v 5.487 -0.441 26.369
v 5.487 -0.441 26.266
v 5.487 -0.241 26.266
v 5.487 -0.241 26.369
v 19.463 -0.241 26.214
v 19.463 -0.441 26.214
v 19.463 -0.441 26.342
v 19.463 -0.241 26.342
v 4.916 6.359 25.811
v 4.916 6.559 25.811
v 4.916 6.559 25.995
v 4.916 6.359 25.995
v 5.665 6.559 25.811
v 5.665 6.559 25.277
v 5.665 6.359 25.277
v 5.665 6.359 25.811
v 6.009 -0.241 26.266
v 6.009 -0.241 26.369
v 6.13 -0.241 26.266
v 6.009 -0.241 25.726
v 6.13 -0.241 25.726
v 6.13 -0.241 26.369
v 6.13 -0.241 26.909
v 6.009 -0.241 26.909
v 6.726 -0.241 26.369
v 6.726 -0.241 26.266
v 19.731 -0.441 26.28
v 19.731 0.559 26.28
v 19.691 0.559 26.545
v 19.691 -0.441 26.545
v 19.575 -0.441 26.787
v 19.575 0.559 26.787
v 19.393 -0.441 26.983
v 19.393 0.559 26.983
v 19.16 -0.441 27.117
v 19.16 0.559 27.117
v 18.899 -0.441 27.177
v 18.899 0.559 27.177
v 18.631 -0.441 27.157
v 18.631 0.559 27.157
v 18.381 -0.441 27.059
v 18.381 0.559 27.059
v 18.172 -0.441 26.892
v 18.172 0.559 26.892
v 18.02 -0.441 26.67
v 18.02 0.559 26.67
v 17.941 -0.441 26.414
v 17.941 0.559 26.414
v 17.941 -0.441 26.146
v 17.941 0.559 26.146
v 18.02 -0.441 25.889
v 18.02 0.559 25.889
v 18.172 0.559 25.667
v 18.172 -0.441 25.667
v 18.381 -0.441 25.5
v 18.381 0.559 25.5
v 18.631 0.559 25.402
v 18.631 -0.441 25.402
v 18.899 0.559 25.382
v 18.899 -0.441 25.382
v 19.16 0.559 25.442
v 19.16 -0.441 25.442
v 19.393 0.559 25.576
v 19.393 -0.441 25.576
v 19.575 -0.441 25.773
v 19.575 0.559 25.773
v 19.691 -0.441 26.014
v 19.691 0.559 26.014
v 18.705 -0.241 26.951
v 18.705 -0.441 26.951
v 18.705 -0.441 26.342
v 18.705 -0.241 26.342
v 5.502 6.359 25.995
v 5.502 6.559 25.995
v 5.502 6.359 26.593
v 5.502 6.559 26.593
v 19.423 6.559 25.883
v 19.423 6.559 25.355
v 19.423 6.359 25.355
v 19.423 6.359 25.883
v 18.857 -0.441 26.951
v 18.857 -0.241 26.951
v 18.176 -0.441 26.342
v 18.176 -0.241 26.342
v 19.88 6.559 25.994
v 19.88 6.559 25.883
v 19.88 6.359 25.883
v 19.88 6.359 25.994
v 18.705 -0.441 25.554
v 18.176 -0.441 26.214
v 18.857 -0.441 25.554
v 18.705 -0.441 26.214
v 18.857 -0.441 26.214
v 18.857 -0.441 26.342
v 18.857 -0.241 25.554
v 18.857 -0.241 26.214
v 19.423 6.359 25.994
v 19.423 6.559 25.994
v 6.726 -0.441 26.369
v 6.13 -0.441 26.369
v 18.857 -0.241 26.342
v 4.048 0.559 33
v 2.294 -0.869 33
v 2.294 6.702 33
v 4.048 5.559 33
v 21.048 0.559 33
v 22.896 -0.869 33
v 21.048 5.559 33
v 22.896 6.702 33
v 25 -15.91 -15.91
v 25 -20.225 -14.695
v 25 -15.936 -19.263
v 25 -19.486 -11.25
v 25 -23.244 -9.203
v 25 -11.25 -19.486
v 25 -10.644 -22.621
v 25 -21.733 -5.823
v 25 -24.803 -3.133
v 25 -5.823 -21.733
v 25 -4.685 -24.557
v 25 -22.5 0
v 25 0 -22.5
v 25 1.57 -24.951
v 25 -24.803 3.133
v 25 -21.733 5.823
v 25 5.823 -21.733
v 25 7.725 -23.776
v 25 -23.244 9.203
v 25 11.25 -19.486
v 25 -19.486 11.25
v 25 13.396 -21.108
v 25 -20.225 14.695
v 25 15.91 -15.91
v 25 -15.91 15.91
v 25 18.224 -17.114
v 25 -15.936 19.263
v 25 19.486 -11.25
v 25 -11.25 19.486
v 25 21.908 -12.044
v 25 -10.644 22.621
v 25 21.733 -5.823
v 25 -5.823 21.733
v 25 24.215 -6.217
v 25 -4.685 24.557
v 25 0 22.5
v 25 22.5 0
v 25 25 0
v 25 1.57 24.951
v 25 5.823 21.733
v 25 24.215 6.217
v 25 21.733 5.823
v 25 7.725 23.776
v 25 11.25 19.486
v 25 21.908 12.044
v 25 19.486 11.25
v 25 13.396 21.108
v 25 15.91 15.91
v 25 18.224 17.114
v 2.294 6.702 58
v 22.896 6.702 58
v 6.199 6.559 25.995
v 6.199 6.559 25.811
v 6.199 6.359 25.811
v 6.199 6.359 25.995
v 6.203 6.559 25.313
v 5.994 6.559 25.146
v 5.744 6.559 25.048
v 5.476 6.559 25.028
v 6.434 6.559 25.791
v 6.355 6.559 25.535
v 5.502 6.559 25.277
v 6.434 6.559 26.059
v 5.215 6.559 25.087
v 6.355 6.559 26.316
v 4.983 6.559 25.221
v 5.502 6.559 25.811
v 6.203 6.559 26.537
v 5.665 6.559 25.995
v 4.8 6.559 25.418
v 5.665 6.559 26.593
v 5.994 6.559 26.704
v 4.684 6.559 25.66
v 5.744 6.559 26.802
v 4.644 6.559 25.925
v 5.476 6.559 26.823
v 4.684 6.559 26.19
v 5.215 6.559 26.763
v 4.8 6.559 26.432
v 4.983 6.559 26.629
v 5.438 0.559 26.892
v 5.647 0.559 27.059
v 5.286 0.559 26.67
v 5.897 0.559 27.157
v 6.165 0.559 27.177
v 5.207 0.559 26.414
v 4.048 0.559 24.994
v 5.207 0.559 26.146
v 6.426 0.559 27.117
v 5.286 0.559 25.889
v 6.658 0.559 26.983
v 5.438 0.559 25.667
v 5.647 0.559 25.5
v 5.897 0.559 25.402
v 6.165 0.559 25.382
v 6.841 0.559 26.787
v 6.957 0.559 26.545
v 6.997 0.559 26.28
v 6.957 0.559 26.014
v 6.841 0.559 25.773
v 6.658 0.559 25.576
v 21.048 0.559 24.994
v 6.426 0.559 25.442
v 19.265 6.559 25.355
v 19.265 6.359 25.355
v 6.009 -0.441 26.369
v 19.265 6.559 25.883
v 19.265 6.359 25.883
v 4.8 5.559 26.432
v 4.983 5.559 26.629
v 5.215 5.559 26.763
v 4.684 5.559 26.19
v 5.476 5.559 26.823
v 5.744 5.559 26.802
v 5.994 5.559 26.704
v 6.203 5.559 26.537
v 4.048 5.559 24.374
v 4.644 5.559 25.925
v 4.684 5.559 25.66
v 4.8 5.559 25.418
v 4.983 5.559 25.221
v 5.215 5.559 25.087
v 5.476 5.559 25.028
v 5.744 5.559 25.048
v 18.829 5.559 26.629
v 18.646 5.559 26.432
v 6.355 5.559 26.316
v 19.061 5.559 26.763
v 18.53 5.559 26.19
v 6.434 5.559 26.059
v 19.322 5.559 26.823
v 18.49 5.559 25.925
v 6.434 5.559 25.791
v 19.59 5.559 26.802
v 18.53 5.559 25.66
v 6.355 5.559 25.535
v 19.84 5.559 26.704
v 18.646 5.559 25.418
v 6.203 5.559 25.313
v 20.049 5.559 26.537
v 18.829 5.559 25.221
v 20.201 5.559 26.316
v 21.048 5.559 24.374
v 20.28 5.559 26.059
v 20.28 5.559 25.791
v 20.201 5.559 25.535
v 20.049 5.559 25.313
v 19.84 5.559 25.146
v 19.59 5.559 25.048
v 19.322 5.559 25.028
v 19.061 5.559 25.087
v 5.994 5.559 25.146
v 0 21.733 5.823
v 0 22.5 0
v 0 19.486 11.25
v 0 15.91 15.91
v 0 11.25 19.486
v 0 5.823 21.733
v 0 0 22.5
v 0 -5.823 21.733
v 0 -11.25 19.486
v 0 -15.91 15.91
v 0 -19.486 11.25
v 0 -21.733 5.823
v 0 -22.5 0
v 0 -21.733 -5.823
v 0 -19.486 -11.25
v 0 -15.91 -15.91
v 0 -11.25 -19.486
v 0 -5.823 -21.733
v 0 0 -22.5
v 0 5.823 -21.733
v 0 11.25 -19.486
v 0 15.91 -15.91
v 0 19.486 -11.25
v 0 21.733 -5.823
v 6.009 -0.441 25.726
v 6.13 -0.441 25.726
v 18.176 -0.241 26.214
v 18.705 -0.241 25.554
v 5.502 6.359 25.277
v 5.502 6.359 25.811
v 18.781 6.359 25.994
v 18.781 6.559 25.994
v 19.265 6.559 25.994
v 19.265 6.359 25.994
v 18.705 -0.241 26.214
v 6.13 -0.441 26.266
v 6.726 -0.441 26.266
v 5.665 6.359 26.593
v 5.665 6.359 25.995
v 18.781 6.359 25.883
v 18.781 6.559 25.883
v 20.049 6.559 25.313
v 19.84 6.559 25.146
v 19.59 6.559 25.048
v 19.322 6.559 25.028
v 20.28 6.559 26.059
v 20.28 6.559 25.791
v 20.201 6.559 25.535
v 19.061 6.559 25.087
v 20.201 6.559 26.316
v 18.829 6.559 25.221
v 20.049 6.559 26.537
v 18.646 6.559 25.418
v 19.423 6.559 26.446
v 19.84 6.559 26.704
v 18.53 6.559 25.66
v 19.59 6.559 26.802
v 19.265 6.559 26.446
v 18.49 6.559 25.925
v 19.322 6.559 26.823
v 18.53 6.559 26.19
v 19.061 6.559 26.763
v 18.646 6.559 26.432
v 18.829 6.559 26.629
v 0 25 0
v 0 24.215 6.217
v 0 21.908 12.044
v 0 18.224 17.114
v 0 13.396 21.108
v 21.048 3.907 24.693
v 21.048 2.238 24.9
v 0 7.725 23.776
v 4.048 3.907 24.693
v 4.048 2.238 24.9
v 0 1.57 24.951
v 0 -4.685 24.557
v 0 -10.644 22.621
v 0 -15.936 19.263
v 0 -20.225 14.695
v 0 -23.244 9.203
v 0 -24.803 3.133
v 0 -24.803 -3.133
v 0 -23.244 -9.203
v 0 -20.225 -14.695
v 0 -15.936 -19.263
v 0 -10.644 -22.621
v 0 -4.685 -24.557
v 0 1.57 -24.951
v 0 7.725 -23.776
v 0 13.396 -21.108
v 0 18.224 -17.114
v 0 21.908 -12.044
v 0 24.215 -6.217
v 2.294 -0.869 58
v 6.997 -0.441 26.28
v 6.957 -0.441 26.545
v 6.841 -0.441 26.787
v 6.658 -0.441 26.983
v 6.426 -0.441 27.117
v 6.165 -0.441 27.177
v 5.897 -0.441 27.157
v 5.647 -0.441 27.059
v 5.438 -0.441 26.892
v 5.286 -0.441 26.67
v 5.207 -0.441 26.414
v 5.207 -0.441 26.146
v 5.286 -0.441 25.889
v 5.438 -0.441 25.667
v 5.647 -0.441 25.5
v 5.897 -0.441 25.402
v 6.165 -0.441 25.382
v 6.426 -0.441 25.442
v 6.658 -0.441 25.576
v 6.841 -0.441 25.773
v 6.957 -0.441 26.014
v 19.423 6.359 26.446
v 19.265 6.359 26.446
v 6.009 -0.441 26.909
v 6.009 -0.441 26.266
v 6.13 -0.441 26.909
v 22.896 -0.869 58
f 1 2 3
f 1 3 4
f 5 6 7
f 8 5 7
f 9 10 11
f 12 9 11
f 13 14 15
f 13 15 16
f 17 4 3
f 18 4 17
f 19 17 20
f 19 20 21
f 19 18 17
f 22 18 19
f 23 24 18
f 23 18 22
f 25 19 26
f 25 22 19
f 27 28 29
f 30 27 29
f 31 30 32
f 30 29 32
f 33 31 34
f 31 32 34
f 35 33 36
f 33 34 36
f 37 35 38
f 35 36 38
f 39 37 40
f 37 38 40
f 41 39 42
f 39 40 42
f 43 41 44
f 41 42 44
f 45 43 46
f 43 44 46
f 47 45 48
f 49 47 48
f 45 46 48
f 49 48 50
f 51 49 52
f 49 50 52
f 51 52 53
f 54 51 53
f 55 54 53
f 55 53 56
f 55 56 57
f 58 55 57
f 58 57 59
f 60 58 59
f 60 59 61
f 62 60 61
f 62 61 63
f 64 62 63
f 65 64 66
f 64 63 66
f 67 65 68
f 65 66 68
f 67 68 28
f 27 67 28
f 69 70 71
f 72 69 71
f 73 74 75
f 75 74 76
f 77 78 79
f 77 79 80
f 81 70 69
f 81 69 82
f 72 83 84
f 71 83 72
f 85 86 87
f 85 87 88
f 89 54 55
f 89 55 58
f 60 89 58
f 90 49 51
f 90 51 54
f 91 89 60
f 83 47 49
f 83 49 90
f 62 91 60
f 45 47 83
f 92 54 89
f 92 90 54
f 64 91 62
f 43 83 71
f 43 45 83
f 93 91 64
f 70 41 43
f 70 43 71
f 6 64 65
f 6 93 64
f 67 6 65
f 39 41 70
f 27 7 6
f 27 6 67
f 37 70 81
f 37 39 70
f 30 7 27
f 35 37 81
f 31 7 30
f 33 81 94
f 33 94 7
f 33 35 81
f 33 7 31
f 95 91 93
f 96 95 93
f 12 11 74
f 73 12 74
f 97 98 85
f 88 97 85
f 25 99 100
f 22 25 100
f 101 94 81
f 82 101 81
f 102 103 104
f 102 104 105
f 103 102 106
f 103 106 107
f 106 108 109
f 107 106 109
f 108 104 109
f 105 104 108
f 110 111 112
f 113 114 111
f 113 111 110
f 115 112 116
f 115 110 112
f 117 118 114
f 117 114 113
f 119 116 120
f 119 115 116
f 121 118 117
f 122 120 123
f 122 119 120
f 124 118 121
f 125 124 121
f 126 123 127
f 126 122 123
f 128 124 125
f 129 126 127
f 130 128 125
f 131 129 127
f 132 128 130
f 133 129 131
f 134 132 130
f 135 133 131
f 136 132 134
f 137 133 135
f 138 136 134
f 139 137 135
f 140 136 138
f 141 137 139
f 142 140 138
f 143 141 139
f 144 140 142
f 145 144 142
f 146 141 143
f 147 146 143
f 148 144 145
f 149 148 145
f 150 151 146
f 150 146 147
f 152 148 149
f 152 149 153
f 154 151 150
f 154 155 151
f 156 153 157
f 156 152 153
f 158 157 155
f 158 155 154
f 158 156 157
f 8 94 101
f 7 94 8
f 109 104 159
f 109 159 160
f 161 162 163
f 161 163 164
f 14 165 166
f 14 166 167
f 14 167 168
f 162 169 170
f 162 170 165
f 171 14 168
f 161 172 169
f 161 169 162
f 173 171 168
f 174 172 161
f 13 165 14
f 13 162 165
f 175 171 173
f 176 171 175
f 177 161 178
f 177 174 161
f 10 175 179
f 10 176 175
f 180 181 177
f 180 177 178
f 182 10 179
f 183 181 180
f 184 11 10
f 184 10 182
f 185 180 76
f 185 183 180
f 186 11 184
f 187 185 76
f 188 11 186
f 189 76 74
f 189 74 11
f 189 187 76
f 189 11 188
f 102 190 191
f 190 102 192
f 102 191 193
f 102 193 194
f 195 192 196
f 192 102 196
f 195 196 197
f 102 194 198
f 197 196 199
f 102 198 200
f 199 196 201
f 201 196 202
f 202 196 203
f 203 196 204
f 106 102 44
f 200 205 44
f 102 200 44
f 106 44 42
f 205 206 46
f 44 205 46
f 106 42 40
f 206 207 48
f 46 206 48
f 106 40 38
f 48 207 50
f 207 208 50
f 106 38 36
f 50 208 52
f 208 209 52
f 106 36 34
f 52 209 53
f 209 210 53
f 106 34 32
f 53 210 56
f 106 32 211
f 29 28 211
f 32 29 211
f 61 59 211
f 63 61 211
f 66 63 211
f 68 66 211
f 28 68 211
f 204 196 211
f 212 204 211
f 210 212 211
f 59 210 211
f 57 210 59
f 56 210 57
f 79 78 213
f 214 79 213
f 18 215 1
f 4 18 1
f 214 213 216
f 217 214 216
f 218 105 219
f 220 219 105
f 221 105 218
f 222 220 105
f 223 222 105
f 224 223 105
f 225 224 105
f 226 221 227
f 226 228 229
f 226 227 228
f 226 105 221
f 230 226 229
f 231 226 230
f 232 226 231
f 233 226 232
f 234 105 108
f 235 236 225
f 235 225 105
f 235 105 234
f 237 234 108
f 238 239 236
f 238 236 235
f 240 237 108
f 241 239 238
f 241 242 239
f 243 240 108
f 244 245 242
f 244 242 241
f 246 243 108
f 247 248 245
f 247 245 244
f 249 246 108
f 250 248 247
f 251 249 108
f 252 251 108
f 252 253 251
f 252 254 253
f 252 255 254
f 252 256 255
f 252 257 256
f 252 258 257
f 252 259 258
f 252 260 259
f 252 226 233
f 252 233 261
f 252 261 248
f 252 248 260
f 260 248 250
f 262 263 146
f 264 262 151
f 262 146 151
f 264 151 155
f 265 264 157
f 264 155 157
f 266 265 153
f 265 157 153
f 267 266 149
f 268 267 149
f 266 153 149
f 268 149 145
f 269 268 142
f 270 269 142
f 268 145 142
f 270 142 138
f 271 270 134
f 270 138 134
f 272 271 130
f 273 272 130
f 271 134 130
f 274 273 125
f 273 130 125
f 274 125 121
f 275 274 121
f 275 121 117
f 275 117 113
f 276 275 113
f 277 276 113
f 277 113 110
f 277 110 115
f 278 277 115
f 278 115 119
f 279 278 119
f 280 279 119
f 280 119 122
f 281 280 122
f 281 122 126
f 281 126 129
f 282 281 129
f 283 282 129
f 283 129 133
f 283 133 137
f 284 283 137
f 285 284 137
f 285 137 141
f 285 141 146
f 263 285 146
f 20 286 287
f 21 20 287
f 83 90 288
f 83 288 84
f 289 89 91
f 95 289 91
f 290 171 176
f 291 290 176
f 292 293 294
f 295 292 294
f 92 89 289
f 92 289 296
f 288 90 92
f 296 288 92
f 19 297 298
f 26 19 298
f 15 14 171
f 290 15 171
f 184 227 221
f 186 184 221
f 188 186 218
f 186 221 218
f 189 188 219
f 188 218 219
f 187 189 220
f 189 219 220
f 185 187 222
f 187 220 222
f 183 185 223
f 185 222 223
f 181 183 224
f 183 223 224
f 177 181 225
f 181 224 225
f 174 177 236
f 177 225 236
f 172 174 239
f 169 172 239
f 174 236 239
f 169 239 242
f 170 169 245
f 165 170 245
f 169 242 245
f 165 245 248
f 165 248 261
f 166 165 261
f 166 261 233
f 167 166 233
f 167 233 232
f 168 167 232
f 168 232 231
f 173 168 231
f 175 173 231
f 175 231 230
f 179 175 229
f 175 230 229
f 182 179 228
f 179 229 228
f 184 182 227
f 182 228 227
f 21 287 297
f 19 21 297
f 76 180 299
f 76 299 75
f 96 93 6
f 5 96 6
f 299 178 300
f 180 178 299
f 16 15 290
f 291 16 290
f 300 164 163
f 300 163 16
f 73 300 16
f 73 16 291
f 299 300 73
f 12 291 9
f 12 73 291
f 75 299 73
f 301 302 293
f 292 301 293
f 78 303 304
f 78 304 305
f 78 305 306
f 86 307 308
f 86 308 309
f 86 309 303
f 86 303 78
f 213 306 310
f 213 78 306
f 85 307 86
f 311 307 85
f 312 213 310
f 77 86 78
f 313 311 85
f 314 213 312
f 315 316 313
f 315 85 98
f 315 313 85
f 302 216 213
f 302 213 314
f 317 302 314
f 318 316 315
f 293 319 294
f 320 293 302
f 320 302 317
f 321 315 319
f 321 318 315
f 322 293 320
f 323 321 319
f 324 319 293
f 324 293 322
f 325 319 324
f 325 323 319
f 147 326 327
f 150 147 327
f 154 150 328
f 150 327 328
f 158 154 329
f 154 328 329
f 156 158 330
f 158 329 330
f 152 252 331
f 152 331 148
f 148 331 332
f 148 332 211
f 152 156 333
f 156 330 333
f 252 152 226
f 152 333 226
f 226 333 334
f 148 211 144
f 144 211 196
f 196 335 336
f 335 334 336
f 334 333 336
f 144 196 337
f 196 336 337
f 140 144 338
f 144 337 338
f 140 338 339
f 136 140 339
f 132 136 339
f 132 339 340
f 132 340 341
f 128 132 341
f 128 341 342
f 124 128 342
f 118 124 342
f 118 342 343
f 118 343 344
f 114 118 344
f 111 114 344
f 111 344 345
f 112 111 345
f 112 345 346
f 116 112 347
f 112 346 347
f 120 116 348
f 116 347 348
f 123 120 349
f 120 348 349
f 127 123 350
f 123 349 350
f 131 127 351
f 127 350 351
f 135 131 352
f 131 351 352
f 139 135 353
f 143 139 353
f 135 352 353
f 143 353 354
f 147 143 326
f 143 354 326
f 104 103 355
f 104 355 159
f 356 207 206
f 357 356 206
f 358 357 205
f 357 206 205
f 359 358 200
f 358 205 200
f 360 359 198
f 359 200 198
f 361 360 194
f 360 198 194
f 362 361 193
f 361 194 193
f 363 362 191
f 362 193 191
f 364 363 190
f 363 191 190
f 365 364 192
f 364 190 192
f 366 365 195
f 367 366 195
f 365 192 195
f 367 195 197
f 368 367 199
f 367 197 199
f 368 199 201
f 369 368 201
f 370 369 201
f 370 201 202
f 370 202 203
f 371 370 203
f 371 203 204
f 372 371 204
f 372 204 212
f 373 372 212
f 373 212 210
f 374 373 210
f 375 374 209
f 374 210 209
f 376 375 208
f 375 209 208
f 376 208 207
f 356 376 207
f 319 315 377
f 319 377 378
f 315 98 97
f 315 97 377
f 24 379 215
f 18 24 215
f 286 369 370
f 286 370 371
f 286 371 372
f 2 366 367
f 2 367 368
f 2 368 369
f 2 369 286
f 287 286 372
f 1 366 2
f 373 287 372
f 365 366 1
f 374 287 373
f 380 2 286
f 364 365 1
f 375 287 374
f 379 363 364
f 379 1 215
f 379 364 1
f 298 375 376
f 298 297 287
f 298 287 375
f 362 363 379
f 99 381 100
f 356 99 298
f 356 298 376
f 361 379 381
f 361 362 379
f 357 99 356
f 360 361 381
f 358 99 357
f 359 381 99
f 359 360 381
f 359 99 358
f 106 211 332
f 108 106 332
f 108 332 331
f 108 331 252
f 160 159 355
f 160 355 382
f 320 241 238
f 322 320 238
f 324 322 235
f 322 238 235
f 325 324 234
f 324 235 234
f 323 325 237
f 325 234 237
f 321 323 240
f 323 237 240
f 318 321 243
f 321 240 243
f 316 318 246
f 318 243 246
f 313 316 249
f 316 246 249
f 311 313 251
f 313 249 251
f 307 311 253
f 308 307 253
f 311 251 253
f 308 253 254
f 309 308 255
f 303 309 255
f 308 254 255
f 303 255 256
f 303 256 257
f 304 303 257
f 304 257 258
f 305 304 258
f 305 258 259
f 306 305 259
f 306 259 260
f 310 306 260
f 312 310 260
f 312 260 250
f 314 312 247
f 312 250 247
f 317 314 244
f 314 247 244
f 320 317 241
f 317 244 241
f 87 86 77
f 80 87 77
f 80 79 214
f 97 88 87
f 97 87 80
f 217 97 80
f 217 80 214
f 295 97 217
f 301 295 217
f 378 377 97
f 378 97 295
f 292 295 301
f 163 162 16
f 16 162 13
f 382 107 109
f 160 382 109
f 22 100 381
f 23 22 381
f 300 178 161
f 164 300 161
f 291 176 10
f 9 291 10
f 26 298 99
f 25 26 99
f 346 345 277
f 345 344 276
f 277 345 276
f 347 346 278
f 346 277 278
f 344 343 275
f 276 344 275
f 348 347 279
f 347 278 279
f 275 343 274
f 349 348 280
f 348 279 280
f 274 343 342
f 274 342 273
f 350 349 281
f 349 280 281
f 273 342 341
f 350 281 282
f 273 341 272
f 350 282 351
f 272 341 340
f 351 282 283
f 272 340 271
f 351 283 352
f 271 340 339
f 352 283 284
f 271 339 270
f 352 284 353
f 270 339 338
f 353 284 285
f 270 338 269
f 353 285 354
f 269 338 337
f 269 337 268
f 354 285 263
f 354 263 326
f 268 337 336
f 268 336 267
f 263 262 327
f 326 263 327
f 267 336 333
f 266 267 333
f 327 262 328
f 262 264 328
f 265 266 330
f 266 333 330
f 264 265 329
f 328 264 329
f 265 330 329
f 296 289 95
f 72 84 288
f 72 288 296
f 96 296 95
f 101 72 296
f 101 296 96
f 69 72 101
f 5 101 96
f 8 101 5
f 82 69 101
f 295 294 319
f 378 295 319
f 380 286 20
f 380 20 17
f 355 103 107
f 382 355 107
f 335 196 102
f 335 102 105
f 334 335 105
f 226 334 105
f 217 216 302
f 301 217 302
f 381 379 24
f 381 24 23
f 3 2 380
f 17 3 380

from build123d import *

# Parameters (mm, degrees)
F0_R      = 25
F1_DEPTH  = 25
F2_R      = 22.5
F3_DEPTH  = 30
F5_W      = 17
F5_H      = 5
F6_DEPTH  = 10
F7_R      = 0.9
F8_DEPTH  = 1
F9_W      = 0.4566367716
F9_H      = 0.1114215702
F9_W_2    = 0.1583136618
F9_H_2    = 0.5275197327
F9_W_3    = 0.4842821509
F9_H_3    = 0.4520714283
F10_DEPTH = 0.2
F11_W     = 0.1633954234
F11_H     = 0.5346611142
F11_W_2   = 0.5340673961
F11_H_2   = 0.1833848655
F11_W_3   = 0.5863611586
F11_H_3   = 0.598071143
F12_DEPTH = 0.2
F13_R     = 0.9
F14_DEPTH = 1
F16_W     = 0.1523271203
F16_H     = 0.6093140692
F16_H_2   = 0.1280289143
F16_W_2   = 0.5286876112
F16_W_3   = 0.605950132
F16_H_3   = 0.6601605564
F17_DEPTH = 0.2
F15_W     = 0.1208484173
F15_H     = 0.469468534
F15_H_2   = 0.0698883086
F15_W_2   = 0.0528423116
F15_H_3   = 0.1033879817
F15_W_3   = 0.0704331324
F15_W_4   = 0.469468534
F15_H_4   = 0.5403161049
F15_W_5   = 0.5258051679
F18_DEPTH = 0.2
F19_W     = 20.6024695653
F19_H     = 7.5707876822
F19_W_2   = 17
F19_H_2   = 5
F20_DEPTH = 25


with BuildPart() as f1:
    # F0 (on Right) → F1 (new body)
    with BuildSketch(Plane.YZ):
        Circle(F0_R)
    extrude(amount=F1_DEPTH)

    # F2 (on face) → F3 (cut)
    with BuildSketch(Plane.YZ.offset(25)):
        Circle(F2_R)
    extrude(amount=-F3_DEPTH, mode=Mode.SUBTRACT)

    # F5 (on offset) → F6 (join)
    with BuildSketch(Plane.XY.offset(23)):
        with Locations((12.5475367568, 3.0585098453)):
            Rectangle(F5_W, F5_H)
    extrude(amount=F6_DEPTH)

    # F7 (on face) → F8 (join)
    with BuildSketch(Plane(origin=(0, 5.5585098453, 0), x_dir=(-1, 0, 0), z_dir=(0, 1, 0))):
        with Locations((-19.3896782356, 25.9250514209)):
            Circle(F7_R)
        with Locations((-5.5436493817, 25.9250514209)):
            Circle(F7_R)
    extrude(amount=F8_DEPTH)

    # F9 (on face) → F10 (cut)
    with BuildSketch(Plane(origin=(0, 6.5585098453, 0), x_dir=(-1, 0, 0), z_dir=(0, 1, 0))):
        with Locations((-19.6518069133, 25.9384280071)):
            Rectangle(F9_W, F9_H)
        with Locations((-19.3443316966, 25.9384280071)):
            Rectangle(F9_W_2, F9_H)
        with Locations((-19.3443316966, 25.6189573556)):
            Rectangle(F9_W_2, F9_H_2)
        with Locations((-19.0230337903, 25.9384280071)):
            Rectangle(F9_W_3, F9_H)
        with Locations((-19.3443316966, 26.2201745063)):
            Rectangle(F9_W_2, F9_H_3)
    extrude(amount=-F10_DEPTH, mode=Mode.SUBTRACT)

    # F11 (on face) → F12 (cut)
    with BuildSketch(Plane(origin=(0, 6.5585098453, 0), x_dir=(-1, 0, 0), z_dir=(0, 1, 0))):
        with Locations((-5.5837228429, 25.5438815802)):
            Rectangle(F11_W, F11_H)
        with Locations((-5.9324542526, 25.9029045701)):
            Rectangle(F11_W_2, F11_H_2)
        with Locations((-5.5837228429, 25.9029045701)):
            Rectangle(F11_W, F11_H_2)
        with Locations((-5.2088445518, 25.9029045701)):
            Rectangle(F11_W_3, F11_H_2)
        with Locations((-5.5837228429, 26.2936325744)):
            Rectangle(F11_W, F11_H_3)
    extrude(amount=-F12_DEPTH, mode=Mode.SUBTRACT)

    # F13 (on face) → F14 (join)
    with BuildSketch(Plane.XZ.offset(-0.5585098453)):
        with Locations((6.0973112057, 26.2796394527)):
            Circle(F13_R)
        with Locations((18.8313634067, 26.2796394527)):
            Circle(F13_R)
    extrude(amount=F14_DEPTH)

    # F16 (on face) → F17 (cut)
    with BuildSketch(Plane.XZ.offset(0.4414901547)):
        with Locations((18.7808908522, 26.6468180344)):
            Rectangle(F16_W, F16_H)
        with Locations((18.7808908522, 26.2781465426)):
            Rectangle(F16_W, F16_H_2)
        with Locations((18.4403834864, 26.2781465426)):
            Rectangle(F16_W_2, F16_H_2)
        with Locations((19.1600294784, 26.2781465426)):
            Rectangle(F16_W_3, F16_H_2)
        with Locations((18.7808908522, 25.8840518072)):
            Rectangle(F16_W, F16_H_3)
    extrude(amount=-F17_DEPTH, mode=Mode.SUBTRACT)

    # F15 (on face) → F18 (cut)
    with BuildSketch(Plane.XZ.offset(0.4414901547)):
        with Locations((6.0697374865, 26.6739912331)):
            Rectangle(F15_W, F15_H)
        with Locations((6.0697374865, 26.4043128118)):
            Rectangle(F15_W, F15_H_2)
        with Locations((5.9828921221, 26.3176746666)):
            Rectangle(F15_W_2, F15_H_3)
        with Locations((6.0697374865, 26.3176746666)):
            Rectangle(F15_W, F15_H_3)
        with Locations((6.1653782614, 26.3176746666)):
            Rectangle(F15_W_3, F15_H_3)
        with Locations((5.7217366993, 26.3176746666)):
            Rectangle(F15_W_4, F15_H_3)
        with Locations((6.0697374865, 25.9958226234)):
            Rectangle(F15_W, F15_H_4)
        with Locations((6.4634974115, 26.3176746666)):
            Rectangle(F15_W_5, F15_H_3)
    extrude(amount=-F18_DEPTH, mode=Mode.SUBTRACT)

    # F19 (on face) → F20 (join)
    with BuildSketch(Plane.XY.offset(33)):
        with Locations((12.5949246576, 2.9163391446)):
            Rectangle(F19_W, F19_H)
        with Locations((12.5475367568, 3.0585098453)):
            Rectangle(F19_W_2, F19_H_2, mode=Mode.SUBTRACT)
        with Locations((12.5475367568, 3.0585098453)):
            Rectangle(F19_W_2, F19_H_2)
    extrude(amount=F20_DEPTH)


solid = f1.part
